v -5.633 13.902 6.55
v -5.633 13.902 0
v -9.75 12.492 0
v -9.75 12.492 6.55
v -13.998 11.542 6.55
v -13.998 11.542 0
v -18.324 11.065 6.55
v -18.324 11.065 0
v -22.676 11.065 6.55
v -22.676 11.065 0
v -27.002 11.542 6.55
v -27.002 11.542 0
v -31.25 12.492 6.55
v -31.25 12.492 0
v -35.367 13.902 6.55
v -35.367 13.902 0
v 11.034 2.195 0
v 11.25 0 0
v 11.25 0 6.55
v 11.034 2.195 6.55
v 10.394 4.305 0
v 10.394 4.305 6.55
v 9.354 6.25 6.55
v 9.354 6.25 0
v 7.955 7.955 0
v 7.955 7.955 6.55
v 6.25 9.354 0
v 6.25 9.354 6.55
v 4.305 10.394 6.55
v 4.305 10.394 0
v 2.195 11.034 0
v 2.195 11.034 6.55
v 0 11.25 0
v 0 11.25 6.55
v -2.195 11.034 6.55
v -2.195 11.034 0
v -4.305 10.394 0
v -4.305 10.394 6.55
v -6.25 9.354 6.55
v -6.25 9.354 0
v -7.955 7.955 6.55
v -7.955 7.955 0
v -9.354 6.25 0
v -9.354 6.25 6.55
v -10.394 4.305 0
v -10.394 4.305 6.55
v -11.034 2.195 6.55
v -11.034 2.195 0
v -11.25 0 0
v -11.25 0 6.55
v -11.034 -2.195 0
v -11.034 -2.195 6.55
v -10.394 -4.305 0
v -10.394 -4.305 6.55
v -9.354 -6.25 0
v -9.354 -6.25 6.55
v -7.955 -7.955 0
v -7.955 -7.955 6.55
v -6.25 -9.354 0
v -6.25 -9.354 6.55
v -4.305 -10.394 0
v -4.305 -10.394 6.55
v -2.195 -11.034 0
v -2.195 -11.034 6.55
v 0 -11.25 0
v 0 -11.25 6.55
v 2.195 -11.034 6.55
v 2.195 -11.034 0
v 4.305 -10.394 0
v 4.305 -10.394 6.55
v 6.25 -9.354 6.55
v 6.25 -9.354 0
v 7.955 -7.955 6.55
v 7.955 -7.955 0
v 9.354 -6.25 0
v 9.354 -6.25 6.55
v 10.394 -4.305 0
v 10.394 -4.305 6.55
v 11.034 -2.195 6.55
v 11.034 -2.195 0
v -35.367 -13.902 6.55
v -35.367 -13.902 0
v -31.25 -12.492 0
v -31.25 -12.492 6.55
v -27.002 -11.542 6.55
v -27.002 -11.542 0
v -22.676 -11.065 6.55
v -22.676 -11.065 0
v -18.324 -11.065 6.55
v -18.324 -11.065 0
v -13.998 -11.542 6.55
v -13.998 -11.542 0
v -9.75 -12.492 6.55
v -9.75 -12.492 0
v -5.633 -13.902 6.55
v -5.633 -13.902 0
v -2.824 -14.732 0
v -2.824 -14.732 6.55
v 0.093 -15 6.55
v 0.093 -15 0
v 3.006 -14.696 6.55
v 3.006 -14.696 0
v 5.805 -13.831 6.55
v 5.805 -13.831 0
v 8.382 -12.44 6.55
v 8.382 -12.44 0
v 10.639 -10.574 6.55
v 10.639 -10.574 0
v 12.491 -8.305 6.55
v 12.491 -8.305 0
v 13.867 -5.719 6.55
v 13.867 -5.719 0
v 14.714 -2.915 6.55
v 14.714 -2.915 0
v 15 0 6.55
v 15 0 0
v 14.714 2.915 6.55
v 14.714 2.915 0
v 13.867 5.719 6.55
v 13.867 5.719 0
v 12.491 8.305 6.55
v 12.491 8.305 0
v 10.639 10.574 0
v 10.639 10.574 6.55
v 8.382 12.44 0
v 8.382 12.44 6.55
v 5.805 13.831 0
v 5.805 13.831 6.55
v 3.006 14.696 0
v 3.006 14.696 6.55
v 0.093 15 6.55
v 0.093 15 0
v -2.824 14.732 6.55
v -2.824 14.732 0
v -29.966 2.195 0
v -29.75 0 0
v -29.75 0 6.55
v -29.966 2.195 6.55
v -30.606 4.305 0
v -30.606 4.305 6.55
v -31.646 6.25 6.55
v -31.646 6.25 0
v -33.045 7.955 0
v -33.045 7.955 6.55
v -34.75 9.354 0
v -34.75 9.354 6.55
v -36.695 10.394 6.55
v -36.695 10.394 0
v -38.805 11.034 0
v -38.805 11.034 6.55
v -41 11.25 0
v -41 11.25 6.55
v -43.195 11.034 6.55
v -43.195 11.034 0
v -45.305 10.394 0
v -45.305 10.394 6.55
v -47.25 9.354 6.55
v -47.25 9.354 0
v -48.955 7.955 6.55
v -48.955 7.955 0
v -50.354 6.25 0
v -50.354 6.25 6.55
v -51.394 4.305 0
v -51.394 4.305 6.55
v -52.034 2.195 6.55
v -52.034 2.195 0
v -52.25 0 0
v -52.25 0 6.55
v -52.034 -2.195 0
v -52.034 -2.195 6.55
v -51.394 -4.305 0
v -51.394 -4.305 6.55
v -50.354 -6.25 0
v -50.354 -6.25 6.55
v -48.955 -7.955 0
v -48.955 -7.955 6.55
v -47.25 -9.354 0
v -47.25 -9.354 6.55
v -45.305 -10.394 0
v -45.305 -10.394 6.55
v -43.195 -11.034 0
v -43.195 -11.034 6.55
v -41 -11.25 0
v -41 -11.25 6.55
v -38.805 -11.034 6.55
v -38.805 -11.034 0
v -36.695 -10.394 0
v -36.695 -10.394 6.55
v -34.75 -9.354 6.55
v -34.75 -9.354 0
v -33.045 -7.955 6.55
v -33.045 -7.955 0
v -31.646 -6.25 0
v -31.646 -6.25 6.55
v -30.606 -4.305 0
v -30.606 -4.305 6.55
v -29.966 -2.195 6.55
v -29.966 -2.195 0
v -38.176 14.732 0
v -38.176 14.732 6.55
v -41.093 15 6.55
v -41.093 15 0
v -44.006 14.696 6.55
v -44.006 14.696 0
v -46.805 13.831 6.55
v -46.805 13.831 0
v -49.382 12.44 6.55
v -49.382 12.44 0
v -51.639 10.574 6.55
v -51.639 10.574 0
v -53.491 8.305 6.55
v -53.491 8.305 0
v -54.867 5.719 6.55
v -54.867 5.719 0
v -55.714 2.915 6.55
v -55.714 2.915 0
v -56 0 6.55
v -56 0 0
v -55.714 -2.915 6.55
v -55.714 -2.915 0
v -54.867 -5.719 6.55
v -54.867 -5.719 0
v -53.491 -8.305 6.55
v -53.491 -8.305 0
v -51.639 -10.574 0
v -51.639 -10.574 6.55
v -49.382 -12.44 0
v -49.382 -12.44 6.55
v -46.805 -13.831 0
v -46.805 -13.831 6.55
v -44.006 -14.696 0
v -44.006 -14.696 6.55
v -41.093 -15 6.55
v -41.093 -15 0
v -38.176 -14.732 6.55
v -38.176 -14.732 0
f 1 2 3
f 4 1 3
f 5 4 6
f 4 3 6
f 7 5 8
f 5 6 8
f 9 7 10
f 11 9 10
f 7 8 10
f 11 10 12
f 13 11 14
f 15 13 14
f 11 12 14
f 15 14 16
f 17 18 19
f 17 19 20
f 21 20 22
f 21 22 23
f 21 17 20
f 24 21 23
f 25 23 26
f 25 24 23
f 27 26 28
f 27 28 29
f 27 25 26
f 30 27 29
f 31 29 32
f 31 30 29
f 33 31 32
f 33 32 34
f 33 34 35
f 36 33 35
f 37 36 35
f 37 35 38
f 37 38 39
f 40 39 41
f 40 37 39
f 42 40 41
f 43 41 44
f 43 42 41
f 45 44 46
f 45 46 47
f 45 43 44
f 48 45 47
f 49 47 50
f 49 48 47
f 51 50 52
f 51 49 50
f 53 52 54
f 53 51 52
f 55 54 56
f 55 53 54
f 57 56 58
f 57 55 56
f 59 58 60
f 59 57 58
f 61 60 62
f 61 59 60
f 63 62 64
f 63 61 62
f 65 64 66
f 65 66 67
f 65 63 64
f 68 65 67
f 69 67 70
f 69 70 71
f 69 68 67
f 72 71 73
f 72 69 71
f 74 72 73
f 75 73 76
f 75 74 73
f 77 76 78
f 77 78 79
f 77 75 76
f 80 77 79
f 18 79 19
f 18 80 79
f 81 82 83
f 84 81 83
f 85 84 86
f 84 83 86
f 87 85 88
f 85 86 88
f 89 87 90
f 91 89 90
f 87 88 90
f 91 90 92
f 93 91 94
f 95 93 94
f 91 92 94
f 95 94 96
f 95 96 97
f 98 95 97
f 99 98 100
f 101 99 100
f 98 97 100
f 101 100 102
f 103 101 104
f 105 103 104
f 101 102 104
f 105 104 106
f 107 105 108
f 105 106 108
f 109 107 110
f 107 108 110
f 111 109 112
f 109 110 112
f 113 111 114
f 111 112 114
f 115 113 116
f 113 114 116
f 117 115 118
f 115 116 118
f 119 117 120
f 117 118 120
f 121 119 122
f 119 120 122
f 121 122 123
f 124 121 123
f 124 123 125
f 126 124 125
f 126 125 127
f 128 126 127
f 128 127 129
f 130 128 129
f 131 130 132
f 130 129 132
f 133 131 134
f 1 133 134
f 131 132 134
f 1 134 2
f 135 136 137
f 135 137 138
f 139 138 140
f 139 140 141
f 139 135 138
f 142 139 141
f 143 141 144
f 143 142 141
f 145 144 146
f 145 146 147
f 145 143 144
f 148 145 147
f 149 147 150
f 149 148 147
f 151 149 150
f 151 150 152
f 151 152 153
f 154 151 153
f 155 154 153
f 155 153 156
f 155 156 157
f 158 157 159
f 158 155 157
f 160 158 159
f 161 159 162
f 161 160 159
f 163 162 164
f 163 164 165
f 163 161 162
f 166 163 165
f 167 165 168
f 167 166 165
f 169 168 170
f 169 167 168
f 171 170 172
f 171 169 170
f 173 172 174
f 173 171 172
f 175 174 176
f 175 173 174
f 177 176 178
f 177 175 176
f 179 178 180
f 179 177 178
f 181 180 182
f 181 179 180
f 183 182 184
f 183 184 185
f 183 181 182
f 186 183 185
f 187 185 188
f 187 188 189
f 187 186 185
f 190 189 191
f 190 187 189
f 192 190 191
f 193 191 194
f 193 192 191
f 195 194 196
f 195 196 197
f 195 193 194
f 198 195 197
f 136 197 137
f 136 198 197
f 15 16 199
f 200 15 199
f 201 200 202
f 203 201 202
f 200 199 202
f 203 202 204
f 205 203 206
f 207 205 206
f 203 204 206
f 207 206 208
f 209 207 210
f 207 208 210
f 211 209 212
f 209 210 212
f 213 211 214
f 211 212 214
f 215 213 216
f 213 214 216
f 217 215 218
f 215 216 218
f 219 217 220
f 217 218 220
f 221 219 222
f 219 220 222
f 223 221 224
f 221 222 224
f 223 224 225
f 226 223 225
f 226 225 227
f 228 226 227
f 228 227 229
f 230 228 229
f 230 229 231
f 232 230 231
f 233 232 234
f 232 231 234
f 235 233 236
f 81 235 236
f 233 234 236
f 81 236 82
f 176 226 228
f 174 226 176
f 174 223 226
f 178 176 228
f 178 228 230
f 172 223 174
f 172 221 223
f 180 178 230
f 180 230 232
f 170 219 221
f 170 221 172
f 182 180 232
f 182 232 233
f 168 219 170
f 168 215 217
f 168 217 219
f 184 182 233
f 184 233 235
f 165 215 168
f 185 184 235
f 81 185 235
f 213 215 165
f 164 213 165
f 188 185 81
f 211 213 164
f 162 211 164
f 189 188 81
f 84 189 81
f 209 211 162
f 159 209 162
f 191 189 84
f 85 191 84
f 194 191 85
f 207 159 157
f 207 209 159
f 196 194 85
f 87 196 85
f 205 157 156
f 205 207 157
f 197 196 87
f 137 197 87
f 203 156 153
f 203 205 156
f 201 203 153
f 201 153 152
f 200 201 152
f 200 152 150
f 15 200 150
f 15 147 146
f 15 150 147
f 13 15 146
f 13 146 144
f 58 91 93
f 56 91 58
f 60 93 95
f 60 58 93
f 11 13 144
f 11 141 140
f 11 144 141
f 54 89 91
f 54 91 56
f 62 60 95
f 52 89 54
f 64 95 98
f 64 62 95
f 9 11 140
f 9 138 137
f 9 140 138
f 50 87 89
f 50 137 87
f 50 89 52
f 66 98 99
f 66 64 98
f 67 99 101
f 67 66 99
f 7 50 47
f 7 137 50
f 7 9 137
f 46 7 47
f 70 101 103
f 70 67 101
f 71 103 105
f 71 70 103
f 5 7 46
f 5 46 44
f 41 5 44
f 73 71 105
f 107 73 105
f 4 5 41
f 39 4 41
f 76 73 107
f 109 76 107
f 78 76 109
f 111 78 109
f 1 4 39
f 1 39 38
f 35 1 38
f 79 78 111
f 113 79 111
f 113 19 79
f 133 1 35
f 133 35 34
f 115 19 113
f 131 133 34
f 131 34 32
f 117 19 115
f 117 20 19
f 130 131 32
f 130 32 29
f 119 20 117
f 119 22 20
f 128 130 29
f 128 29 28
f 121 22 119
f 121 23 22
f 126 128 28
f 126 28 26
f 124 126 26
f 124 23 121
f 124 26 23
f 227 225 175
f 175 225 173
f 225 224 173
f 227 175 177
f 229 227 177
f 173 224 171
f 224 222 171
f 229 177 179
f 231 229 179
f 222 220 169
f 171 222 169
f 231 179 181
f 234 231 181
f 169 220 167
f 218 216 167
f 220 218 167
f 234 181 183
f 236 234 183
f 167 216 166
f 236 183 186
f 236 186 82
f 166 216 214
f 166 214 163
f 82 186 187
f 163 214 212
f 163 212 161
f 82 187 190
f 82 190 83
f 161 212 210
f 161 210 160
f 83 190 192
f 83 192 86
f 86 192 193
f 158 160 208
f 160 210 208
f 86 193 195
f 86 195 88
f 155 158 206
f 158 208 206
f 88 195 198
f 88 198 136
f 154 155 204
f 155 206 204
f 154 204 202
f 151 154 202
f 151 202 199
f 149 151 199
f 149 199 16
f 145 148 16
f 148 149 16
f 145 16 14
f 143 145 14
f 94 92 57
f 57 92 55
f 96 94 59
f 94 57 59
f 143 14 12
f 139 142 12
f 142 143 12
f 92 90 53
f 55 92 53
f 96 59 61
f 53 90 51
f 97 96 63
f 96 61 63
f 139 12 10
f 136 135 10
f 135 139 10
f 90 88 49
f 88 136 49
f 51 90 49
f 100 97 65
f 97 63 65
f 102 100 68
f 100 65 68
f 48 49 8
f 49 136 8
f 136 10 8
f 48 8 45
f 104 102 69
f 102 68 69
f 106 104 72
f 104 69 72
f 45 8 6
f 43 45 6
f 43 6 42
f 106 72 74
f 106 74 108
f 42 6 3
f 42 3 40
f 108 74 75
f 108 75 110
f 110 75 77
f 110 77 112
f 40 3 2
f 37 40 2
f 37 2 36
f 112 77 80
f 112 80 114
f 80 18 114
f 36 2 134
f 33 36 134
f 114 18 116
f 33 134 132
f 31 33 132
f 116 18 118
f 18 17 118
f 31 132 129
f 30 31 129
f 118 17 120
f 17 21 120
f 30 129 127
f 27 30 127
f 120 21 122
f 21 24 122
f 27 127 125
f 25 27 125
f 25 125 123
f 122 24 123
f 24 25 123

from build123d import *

# Parameters (mm, degrees)
F0_R     = 11.25
F1_DEPTH = 6.55


with BuildPart() as f1:
    # F0 (on Top) → F1 (new body)
    with BuildSketch(Plane.XY):
        with BuildLine():
            ThreePointArc((-35.367126, -13.902184), (-20.5, -11.004665), (-5.632874, -13.902184))
            ThreePointArc((-5.632874, -13.902184), (15, 0), (-5.632874, 13.902184))
            ThreePointArc((-5.632874, 13.902184), (-20.5, 11.004665), (-35.367126, 13.902184))
            ThreePointArc((-35.367126, 13.902184), (-56, 0), (-35.367126, -13.902184))
        make_face()
        with Locations((-41, 0)):
            Circle(F0_R, mode=Mode.SUBTRACT)
        Circle(F0_R, mode=Mode.SUBTRACT)
    extrude(amount=F1_DEPTH)


solid = f1.part
